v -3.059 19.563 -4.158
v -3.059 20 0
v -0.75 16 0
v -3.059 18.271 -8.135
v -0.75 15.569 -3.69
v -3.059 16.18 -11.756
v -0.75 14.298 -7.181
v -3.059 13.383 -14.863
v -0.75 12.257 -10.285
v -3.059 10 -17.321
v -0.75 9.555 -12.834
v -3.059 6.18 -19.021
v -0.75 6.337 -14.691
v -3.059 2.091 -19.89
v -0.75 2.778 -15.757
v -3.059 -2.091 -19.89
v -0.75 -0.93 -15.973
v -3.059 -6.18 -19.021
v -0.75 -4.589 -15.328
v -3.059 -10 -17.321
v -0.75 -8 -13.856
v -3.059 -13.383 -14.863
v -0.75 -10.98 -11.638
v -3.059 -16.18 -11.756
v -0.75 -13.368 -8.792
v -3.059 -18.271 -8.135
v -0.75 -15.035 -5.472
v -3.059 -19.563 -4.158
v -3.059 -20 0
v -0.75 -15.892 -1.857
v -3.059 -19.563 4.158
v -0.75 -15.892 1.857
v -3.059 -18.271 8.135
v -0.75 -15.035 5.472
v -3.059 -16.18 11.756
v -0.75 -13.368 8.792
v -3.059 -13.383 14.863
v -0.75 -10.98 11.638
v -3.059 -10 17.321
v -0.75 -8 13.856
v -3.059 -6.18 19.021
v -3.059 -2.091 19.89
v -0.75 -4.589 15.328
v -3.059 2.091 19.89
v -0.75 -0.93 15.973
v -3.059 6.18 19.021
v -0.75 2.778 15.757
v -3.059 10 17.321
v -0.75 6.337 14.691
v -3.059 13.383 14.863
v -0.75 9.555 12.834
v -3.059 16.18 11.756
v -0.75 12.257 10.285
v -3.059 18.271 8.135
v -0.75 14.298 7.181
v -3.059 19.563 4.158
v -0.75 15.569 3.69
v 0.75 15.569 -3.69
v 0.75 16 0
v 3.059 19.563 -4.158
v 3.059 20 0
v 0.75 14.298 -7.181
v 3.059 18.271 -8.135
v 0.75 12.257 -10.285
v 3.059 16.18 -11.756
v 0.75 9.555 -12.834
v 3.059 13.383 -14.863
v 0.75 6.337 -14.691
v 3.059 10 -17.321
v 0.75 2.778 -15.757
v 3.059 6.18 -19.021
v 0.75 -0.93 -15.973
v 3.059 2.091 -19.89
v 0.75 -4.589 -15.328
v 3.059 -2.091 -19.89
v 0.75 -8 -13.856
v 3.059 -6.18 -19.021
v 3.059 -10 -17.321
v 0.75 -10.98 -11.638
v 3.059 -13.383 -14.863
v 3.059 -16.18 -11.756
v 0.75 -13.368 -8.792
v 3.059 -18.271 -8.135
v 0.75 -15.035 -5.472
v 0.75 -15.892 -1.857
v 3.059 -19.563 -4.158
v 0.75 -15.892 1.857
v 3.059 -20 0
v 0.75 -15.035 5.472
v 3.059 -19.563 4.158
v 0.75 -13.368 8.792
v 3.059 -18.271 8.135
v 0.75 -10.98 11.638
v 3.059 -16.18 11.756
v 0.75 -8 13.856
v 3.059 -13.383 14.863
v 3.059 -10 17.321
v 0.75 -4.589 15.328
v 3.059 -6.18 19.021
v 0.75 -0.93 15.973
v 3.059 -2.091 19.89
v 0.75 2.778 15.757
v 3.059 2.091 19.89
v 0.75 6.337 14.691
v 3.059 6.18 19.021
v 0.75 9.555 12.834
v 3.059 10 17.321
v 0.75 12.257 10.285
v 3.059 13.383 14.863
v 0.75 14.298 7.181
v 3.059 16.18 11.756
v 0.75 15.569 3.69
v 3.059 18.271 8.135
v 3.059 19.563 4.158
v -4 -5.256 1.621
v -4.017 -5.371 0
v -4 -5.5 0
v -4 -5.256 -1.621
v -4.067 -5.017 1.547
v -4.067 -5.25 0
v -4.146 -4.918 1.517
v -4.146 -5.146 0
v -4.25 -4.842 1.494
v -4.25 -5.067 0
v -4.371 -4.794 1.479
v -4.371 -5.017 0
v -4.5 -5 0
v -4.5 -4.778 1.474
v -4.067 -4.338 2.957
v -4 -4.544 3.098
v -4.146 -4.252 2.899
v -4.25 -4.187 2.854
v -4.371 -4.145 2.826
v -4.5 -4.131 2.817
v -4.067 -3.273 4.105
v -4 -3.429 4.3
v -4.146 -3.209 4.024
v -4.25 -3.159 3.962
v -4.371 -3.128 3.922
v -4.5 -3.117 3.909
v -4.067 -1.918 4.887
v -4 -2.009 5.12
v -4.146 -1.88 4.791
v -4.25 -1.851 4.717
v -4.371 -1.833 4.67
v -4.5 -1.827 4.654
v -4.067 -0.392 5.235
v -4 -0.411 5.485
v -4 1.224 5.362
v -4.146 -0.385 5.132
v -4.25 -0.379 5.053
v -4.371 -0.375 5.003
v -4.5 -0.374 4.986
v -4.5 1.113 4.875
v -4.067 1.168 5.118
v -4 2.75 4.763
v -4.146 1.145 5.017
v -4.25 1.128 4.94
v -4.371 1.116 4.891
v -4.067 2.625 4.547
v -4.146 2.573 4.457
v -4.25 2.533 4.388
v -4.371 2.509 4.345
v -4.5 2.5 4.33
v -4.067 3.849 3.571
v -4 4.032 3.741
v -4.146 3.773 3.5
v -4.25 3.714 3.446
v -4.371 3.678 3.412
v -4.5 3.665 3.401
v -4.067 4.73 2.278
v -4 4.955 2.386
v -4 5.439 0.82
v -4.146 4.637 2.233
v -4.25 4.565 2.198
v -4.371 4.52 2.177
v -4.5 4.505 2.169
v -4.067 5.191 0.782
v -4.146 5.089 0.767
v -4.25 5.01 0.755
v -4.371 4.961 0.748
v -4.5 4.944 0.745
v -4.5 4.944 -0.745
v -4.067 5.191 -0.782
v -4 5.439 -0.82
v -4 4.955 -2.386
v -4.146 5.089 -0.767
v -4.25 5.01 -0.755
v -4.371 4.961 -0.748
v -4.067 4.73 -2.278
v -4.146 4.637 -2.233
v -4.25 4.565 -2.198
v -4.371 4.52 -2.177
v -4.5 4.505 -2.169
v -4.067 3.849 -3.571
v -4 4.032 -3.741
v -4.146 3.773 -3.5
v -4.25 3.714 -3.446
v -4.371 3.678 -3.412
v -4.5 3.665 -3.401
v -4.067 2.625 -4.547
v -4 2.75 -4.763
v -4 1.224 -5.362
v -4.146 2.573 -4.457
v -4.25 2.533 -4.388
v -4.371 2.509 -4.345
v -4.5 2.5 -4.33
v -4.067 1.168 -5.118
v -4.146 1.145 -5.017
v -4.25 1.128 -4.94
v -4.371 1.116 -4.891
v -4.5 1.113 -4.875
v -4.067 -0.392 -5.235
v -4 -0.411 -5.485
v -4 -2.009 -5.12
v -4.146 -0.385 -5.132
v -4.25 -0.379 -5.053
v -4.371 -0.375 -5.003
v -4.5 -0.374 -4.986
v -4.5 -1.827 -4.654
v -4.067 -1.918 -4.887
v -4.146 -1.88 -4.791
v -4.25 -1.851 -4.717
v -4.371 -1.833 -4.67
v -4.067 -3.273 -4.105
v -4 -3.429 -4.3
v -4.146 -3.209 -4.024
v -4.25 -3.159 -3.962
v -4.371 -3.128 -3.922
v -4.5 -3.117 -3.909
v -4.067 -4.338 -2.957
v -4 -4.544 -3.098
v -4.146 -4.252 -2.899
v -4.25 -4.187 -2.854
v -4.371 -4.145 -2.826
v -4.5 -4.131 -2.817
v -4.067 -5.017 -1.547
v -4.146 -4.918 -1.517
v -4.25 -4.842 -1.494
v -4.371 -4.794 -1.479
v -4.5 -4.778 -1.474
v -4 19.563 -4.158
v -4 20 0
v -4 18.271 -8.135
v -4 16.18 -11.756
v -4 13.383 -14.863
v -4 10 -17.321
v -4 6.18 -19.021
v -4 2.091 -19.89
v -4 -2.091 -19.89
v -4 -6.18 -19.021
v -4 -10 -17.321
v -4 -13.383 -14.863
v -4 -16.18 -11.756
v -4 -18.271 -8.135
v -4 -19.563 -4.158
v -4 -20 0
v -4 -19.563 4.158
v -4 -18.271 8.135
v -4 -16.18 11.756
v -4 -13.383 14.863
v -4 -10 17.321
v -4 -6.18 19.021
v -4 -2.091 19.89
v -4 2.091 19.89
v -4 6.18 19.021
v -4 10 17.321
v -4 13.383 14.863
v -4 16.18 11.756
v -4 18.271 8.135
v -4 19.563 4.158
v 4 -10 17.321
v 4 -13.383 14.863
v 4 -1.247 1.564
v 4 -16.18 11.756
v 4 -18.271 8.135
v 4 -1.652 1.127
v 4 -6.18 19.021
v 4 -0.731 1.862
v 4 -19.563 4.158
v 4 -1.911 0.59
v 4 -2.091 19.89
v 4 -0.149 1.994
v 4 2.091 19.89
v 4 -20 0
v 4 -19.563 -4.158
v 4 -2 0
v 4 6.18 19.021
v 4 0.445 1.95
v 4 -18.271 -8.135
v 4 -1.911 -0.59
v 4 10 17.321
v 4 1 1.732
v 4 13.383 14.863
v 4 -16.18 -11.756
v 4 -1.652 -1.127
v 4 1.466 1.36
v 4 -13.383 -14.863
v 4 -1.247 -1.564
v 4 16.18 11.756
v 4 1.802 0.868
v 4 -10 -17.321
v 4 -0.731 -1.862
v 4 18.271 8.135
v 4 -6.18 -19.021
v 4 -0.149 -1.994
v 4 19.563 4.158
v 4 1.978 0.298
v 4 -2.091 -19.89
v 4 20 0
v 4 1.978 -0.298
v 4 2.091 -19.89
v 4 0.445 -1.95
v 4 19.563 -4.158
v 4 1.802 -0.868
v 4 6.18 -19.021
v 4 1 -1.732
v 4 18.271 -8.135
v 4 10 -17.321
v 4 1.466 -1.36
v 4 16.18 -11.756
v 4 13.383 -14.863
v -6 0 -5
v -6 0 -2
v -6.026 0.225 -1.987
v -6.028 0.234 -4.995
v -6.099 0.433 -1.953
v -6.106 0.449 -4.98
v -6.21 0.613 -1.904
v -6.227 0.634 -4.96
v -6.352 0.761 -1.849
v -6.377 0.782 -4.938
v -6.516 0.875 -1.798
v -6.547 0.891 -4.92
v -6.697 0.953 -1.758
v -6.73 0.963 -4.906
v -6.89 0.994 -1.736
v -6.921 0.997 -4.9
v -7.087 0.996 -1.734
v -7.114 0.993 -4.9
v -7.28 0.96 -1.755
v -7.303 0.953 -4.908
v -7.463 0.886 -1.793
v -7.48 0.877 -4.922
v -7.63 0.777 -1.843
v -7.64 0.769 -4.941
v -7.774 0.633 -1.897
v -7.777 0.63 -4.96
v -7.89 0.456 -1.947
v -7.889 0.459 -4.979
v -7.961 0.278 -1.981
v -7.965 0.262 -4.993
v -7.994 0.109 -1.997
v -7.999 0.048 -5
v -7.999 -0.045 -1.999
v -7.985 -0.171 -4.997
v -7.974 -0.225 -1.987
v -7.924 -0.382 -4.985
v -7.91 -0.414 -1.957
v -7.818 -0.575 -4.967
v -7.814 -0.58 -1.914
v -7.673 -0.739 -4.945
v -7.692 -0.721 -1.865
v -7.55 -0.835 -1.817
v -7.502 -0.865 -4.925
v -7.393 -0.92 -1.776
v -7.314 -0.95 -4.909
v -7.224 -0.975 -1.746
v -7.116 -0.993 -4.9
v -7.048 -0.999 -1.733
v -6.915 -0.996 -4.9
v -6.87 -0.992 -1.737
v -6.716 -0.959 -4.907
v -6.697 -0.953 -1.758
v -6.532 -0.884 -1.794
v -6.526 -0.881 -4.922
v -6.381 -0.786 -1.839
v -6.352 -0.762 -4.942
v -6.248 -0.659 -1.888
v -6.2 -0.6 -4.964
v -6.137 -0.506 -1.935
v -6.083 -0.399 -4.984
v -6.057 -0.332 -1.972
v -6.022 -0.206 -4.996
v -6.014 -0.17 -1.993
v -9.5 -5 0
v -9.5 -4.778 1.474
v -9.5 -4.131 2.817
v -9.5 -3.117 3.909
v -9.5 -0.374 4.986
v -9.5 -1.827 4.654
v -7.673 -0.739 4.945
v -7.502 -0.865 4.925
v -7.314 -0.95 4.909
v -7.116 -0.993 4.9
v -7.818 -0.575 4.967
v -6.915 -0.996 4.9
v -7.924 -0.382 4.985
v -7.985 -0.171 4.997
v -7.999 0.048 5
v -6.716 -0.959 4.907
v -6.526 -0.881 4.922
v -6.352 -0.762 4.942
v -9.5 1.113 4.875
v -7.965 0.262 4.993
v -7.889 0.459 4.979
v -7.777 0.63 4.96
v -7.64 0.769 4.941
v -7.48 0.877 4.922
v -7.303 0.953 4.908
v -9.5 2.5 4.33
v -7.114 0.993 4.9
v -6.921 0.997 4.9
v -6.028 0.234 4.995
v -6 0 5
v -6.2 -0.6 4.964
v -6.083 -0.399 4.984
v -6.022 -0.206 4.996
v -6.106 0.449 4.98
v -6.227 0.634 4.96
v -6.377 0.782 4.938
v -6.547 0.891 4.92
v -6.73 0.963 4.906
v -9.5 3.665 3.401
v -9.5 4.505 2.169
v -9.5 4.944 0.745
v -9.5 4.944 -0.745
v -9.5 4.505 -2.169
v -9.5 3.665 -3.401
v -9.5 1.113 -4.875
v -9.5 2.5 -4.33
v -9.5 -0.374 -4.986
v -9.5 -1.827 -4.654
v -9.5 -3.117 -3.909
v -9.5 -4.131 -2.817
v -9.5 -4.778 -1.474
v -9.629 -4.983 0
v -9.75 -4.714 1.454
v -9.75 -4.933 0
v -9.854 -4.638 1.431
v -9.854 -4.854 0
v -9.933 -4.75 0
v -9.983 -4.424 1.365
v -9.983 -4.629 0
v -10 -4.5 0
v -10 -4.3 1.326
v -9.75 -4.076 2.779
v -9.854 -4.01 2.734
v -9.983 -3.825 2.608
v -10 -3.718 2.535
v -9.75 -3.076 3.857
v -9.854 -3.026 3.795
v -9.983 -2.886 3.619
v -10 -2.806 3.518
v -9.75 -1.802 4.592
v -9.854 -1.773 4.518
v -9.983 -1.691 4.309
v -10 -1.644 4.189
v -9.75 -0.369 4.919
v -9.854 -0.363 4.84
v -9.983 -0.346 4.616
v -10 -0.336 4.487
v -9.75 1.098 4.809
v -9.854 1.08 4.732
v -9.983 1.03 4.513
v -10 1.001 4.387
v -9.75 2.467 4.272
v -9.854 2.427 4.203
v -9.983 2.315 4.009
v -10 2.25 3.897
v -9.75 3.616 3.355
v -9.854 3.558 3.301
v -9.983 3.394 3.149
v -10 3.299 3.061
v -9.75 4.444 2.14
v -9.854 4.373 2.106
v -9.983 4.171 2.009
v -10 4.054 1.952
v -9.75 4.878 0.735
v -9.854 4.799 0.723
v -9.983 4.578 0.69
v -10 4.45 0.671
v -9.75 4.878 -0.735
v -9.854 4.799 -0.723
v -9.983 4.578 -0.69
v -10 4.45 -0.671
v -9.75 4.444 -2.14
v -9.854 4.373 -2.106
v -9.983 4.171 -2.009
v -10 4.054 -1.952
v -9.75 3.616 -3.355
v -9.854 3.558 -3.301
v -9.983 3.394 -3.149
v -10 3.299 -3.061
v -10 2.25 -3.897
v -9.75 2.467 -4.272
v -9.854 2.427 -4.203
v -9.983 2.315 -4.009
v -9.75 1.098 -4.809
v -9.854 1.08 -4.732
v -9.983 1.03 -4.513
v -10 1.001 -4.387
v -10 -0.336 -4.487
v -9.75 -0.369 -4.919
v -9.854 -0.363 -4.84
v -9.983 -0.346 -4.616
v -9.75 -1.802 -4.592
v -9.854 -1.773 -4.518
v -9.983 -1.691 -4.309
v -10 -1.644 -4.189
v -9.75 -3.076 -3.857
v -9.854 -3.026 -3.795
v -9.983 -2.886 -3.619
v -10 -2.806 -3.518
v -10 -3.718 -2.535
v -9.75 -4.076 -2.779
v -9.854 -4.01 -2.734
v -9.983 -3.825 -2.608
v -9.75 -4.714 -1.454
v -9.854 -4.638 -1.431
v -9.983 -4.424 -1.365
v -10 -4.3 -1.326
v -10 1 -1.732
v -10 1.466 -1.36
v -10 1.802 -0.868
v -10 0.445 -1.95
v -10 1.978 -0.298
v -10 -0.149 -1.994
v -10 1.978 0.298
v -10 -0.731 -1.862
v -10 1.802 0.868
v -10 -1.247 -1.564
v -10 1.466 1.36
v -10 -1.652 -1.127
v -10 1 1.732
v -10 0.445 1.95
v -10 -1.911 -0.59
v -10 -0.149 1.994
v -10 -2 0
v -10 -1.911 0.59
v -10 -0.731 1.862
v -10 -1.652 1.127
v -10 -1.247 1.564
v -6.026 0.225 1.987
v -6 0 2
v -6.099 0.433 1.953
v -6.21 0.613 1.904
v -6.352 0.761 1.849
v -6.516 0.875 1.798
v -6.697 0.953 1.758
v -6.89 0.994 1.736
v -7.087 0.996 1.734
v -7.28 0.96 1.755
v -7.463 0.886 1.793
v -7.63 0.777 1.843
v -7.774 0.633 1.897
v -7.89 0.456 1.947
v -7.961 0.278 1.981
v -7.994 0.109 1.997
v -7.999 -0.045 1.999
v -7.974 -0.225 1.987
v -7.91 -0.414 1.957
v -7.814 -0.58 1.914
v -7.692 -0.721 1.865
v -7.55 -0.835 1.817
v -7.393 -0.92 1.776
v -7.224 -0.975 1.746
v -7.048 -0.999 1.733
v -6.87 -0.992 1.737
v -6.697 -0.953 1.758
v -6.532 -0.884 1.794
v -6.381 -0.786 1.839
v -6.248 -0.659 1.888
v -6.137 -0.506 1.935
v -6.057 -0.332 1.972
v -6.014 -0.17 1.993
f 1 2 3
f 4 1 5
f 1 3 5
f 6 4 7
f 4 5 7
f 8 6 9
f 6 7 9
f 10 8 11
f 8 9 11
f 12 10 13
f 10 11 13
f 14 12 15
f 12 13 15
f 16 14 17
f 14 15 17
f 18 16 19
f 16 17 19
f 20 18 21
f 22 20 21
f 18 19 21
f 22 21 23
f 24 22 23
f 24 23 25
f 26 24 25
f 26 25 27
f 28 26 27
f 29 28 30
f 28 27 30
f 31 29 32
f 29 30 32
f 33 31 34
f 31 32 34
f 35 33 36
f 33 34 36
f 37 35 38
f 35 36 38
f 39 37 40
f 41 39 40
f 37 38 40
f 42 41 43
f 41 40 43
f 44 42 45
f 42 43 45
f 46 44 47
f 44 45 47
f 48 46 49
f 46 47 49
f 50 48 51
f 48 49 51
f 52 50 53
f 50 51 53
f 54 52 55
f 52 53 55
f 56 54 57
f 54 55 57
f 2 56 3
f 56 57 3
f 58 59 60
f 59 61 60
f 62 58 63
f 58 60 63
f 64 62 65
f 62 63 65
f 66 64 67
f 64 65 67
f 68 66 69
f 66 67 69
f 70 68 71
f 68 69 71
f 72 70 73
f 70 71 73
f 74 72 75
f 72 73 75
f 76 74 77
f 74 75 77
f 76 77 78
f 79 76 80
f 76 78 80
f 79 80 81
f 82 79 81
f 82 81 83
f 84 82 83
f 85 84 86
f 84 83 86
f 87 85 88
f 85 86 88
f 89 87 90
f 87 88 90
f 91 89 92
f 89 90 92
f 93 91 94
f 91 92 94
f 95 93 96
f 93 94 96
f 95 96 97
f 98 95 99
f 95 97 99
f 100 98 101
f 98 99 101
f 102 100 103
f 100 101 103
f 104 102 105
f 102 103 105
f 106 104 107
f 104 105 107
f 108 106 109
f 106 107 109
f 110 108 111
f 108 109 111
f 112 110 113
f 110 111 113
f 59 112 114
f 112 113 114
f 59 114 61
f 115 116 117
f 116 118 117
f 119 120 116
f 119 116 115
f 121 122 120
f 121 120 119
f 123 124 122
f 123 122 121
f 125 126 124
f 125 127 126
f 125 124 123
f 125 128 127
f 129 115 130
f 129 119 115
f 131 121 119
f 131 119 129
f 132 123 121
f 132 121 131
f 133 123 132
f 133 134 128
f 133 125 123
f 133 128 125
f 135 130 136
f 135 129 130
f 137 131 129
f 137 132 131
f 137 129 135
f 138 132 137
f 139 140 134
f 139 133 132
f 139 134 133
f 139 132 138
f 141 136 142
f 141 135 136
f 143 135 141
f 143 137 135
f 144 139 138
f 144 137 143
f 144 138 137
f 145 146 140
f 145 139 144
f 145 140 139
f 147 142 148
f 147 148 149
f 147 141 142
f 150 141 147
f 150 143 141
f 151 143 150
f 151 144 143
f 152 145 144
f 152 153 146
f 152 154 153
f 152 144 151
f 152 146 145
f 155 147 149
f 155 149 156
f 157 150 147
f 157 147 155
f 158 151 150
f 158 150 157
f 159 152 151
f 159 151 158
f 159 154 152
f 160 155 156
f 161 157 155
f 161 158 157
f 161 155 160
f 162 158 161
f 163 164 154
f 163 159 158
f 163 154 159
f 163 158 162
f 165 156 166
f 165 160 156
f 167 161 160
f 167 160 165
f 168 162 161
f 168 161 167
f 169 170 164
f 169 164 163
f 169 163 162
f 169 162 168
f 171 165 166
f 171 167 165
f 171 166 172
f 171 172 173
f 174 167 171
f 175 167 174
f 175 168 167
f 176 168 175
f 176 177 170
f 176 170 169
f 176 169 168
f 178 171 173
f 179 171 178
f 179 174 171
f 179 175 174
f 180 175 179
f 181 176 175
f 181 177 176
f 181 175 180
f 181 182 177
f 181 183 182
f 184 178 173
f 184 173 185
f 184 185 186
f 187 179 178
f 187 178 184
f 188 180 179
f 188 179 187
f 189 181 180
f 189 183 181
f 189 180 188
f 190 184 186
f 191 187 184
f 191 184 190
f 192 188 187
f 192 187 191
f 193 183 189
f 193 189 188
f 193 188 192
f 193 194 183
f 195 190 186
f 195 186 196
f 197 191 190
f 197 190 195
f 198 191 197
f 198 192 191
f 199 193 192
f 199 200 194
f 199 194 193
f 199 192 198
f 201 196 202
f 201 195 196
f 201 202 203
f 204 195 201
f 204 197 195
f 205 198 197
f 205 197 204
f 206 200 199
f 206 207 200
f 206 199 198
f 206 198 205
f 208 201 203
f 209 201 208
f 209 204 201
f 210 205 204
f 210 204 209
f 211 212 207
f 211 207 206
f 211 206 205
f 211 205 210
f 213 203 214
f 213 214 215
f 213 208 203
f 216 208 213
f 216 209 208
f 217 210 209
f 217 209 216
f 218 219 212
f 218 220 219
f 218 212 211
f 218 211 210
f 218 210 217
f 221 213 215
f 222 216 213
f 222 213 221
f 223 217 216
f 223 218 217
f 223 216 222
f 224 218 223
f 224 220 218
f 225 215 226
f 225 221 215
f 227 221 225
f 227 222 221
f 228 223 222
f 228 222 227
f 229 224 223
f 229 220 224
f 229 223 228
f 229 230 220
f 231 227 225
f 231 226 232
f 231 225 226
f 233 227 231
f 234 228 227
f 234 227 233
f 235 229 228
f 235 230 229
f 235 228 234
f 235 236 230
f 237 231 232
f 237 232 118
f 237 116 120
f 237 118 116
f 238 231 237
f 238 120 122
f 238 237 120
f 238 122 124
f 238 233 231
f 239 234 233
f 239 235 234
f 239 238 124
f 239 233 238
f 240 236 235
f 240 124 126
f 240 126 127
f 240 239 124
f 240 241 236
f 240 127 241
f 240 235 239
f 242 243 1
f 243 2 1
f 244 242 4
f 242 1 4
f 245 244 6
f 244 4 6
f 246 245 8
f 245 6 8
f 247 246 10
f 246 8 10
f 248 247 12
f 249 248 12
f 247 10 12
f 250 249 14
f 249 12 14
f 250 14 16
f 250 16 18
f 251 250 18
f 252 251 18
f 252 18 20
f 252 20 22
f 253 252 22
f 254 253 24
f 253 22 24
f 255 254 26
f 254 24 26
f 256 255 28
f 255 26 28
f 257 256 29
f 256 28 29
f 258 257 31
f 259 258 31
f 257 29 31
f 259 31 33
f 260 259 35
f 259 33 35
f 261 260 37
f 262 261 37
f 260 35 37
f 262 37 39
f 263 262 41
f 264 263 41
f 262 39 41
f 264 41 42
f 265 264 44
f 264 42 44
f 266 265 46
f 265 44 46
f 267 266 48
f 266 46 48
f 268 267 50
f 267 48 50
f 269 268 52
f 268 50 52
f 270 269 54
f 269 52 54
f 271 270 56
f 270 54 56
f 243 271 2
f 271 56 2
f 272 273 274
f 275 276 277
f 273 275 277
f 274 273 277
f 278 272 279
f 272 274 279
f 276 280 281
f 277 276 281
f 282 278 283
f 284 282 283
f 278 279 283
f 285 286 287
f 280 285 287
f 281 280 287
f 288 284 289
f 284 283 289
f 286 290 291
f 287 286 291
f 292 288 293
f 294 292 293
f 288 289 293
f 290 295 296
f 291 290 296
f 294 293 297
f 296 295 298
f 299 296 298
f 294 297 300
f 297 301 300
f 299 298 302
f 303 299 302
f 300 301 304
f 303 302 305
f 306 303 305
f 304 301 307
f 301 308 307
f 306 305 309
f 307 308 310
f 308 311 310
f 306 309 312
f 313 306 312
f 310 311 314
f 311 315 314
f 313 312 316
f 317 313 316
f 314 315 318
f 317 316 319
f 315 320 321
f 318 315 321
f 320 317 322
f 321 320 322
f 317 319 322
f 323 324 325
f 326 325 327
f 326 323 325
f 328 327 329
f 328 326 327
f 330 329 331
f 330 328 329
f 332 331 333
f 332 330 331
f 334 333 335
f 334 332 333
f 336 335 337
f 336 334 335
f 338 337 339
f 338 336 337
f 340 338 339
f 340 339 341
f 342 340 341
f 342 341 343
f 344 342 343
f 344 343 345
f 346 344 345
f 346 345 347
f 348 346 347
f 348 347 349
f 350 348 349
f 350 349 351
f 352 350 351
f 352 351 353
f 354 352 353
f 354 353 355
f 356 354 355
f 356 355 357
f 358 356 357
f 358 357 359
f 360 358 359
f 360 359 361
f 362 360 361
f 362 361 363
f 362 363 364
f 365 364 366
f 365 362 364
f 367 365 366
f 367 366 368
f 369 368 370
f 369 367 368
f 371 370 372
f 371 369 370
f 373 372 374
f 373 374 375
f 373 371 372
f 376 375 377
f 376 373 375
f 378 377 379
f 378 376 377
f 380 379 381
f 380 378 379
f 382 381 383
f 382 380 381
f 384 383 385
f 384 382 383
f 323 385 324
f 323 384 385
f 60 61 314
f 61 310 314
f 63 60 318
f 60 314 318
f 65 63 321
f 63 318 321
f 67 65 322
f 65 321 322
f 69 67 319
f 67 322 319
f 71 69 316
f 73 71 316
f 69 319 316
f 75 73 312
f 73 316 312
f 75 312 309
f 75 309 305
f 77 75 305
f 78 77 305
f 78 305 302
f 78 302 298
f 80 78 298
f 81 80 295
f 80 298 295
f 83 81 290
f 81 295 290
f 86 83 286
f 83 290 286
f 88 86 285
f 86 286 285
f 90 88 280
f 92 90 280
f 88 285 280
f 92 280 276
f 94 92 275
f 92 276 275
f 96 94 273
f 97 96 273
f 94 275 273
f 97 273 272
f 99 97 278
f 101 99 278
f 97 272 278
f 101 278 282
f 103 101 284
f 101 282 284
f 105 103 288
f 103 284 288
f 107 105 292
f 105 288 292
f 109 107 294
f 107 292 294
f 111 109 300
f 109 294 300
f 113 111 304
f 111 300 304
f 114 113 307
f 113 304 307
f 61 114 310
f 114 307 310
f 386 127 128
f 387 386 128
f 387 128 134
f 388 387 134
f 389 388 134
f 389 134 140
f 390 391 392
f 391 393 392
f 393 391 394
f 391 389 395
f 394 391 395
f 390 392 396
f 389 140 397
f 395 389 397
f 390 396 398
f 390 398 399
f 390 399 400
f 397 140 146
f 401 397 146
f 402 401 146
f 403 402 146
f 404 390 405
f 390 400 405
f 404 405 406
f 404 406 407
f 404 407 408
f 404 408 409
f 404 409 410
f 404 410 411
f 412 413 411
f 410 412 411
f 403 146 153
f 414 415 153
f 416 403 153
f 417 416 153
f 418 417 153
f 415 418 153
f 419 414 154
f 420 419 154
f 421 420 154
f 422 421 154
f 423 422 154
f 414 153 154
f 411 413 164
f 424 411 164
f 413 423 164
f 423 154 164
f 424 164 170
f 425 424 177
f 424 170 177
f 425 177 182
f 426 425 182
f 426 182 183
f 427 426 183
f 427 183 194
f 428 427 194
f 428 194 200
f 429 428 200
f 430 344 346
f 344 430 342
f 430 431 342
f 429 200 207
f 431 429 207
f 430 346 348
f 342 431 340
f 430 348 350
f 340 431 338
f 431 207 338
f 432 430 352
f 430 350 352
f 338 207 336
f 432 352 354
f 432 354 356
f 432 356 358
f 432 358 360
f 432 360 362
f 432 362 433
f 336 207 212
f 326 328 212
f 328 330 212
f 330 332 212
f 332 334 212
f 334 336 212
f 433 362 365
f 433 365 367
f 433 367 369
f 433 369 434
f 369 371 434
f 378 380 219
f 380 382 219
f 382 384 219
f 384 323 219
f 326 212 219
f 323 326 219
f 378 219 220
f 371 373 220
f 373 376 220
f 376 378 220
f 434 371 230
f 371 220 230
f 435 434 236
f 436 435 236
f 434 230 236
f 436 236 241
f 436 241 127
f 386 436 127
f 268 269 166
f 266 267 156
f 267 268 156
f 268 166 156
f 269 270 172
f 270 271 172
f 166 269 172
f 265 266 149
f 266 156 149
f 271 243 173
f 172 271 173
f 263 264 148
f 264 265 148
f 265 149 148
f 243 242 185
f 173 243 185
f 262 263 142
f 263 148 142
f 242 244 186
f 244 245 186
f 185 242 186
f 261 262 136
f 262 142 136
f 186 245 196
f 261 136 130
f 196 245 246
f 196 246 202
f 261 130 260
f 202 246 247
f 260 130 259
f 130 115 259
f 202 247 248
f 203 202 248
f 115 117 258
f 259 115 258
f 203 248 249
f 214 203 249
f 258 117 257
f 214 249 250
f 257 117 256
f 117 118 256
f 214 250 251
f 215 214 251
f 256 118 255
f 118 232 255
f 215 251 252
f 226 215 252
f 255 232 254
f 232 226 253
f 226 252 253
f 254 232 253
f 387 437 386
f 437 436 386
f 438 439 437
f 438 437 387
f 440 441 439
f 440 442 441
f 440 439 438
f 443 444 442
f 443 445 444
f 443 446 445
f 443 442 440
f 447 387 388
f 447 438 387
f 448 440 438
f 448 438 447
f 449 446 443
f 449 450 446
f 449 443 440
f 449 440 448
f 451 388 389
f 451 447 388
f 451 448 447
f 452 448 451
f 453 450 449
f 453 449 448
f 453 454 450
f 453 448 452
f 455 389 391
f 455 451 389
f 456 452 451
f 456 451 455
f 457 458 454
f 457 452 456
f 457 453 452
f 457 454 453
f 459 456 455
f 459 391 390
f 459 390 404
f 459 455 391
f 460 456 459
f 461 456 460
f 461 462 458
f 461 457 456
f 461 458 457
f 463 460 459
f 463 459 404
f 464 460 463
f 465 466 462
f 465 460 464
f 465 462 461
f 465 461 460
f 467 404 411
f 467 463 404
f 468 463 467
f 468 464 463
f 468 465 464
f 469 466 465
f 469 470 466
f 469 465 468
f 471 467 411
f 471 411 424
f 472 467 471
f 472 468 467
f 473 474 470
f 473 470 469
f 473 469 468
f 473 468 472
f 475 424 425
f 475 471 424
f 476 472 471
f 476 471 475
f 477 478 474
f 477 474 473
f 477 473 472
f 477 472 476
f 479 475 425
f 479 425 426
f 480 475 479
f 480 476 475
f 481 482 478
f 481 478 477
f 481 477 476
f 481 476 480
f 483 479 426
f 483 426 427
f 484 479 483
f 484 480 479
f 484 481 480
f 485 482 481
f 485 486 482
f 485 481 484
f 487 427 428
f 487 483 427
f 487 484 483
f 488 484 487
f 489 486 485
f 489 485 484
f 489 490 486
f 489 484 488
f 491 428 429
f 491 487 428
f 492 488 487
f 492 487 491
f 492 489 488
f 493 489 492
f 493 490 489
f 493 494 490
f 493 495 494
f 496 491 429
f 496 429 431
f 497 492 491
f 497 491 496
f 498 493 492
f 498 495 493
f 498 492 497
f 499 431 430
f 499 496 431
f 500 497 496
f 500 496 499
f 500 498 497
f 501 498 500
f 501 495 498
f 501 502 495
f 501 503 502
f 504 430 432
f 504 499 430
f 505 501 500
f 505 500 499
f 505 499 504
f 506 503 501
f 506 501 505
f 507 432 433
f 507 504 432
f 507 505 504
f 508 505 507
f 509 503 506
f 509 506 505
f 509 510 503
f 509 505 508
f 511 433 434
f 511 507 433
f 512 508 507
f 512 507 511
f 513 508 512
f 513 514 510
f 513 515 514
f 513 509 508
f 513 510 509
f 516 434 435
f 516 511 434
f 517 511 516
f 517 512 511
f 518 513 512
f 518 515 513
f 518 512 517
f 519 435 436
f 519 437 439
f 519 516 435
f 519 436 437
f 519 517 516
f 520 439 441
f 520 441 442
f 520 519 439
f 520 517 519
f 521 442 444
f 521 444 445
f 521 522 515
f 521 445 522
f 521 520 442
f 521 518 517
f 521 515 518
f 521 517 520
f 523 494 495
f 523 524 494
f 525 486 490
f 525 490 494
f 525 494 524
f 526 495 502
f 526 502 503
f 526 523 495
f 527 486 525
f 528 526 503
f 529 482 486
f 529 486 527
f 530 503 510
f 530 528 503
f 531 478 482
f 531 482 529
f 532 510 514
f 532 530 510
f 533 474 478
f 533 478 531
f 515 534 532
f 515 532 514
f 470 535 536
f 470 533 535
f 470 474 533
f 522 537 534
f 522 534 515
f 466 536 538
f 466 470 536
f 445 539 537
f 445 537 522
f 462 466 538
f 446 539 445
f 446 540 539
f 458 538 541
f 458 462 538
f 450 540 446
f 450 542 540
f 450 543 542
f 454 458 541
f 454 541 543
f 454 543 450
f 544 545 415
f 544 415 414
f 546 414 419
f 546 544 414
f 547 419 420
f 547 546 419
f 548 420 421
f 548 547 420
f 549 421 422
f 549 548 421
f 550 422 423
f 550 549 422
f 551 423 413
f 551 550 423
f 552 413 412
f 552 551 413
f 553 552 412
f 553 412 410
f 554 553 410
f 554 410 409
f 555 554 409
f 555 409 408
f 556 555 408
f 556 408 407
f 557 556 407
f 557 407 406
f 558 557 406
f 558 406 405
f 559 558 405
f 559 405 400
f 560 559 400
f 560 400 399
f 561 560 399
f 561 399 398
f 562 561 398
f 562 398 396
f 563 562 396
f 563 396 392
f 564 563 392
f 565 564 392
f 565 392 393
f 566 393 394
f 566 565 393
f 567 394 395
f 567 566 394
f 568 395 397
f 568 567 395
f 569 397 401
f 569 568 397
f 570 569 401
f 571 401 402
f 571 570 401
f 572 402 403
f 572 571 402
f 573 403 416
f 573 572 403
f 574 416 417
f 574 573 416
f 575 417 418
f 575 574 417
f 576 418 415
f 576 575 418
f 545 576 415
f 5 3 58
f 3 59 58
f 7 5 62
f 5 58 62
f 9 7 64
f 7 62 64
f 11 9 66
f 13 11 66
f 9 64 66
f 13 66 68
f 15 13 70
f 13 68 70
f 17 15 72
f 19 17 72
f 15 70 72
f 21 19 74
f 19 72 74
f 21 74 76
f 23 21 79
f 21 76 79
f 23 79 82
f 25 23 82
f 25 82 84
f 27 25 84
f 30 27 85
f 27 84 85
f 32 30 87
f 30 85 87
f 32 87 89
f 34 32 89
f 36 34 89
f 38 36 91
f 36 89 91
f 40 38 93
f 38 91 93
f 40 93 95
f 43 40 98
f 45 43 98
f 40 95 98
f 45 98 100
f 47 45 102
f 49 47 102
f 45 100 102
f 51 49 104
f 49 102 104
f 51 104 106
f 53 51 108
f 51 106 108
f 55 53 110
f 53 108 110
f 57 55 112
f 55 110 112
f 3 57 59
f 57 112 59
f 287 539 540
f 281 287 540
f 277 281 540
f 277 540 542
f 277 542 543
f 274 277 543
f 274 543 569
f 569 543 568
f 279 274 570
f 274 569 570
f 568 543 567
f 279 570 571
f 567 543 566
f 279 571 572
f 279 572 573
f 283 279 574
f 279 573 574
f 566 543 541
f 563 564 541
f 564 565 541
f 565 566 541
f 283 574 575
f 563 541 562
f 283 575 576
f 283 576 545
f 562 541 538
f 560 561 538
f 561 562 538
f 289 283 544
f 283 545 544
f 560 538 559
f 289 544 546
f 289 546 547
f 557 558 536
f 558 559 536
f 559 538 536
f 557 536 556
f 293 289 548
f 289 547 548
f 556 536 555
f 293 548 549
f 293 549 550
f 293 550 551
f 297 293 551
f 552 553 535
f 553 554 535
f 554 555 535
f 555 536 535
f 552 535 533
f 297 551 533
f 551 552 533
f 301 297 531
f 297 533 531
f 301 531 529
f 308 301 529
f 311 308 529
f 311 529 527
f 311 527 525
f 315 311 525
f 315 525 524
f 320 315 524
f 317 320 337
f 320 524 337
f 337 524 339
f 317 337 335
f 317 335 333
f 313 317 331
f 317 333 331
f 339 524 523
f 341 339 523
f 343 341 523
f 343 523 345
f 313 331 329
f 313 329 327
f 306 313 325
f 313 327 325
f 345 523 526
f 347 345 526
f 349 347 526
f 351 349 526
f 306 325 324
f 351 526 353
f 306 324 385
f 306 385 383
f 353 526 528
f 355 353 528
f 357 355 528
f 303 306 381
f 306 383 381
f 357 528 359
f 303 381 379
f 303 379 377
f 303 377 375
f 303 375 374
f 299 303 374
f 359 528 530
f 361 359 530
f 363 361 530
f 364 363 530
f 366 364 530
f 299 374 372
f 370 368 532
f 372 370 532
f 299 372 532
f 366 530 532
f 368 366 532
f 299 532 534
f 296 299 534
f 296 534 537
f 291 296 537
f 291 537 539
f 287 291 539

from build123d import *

# Parameters (mm, degrees)
SKETCH2_R               = 5
BOSS_EXTRUDE1_DEPTH     = 6
SKETCH3_R               = 2
CUT_EXTRUDE1_DEPTH      = 32.559467676
FILLET1_R               = 0.5
CUT_EXTRUDE2_DEPTH      = 31
CUT_EXTRUDE2_DEPTH_BACK = 31
SKETCH4_R               = 1


with BuildPart() as part:
    # Sketch1 → Revolve1 (revolve)
    with BuildSketch(Plane.XY):
        Polygon((-3.059401077, 20), (-0.75, 16), (0.75, 16), (3.059401077, 20), (4, 20), (4, 0), (-4, 0), (-4, 20), align=None)
    revolve(axis=Axis((4, 0, 0), (-1, 0, 0)))

    # Sketch2 → Boss-Extrude1 (add)
    with BuildSketch(Plane.ZY.offset(4)):
        with Locations(Location((0, 0, 0), (0, 0, 270))):
            Circle(SKETCH2_R)
    extrude(amount=BOSS_EXTRUDE1_DEPTH)

    # Sketch3 → Cut-Extrude1 (cut, through all)
    with BuildSketch(Plane.ZY.offset(10)):
        with Locations(Location((0, 0, 0), (0, 0, 270))):
            Circle(SKETCH3_R)
    extrude(amount=-CUT_EXTRUDE1_DEPTH, mode=Mode.SUBTRACT)

    # Fillet1
    fillet1_edges = [part.edges().sort_by_distance(p)[0] for p in [
        (-4, 5, 0),
        (-10, 5, 0),
    ]]
    fillet(fillet1_edges, radius=FILLET1_R)

    # Sketch4 → Cut-Extrude2 (cut, two sides: drawn at the far end of the back side and taken through both)
    with BuildSketch(Plane.XY.offset(-CUT_EXTRUDE2_DEPTH_BACK)):
        with Locations((-7, 0)):
            Circle(SKETCH4_R)
    extrude(amount=CUT_EXTRUDE2_DEPTH + CUT_EXTRUDE2_DEPTH_BACK, mode=Mode.SUBTRACT)


solid = part.part
